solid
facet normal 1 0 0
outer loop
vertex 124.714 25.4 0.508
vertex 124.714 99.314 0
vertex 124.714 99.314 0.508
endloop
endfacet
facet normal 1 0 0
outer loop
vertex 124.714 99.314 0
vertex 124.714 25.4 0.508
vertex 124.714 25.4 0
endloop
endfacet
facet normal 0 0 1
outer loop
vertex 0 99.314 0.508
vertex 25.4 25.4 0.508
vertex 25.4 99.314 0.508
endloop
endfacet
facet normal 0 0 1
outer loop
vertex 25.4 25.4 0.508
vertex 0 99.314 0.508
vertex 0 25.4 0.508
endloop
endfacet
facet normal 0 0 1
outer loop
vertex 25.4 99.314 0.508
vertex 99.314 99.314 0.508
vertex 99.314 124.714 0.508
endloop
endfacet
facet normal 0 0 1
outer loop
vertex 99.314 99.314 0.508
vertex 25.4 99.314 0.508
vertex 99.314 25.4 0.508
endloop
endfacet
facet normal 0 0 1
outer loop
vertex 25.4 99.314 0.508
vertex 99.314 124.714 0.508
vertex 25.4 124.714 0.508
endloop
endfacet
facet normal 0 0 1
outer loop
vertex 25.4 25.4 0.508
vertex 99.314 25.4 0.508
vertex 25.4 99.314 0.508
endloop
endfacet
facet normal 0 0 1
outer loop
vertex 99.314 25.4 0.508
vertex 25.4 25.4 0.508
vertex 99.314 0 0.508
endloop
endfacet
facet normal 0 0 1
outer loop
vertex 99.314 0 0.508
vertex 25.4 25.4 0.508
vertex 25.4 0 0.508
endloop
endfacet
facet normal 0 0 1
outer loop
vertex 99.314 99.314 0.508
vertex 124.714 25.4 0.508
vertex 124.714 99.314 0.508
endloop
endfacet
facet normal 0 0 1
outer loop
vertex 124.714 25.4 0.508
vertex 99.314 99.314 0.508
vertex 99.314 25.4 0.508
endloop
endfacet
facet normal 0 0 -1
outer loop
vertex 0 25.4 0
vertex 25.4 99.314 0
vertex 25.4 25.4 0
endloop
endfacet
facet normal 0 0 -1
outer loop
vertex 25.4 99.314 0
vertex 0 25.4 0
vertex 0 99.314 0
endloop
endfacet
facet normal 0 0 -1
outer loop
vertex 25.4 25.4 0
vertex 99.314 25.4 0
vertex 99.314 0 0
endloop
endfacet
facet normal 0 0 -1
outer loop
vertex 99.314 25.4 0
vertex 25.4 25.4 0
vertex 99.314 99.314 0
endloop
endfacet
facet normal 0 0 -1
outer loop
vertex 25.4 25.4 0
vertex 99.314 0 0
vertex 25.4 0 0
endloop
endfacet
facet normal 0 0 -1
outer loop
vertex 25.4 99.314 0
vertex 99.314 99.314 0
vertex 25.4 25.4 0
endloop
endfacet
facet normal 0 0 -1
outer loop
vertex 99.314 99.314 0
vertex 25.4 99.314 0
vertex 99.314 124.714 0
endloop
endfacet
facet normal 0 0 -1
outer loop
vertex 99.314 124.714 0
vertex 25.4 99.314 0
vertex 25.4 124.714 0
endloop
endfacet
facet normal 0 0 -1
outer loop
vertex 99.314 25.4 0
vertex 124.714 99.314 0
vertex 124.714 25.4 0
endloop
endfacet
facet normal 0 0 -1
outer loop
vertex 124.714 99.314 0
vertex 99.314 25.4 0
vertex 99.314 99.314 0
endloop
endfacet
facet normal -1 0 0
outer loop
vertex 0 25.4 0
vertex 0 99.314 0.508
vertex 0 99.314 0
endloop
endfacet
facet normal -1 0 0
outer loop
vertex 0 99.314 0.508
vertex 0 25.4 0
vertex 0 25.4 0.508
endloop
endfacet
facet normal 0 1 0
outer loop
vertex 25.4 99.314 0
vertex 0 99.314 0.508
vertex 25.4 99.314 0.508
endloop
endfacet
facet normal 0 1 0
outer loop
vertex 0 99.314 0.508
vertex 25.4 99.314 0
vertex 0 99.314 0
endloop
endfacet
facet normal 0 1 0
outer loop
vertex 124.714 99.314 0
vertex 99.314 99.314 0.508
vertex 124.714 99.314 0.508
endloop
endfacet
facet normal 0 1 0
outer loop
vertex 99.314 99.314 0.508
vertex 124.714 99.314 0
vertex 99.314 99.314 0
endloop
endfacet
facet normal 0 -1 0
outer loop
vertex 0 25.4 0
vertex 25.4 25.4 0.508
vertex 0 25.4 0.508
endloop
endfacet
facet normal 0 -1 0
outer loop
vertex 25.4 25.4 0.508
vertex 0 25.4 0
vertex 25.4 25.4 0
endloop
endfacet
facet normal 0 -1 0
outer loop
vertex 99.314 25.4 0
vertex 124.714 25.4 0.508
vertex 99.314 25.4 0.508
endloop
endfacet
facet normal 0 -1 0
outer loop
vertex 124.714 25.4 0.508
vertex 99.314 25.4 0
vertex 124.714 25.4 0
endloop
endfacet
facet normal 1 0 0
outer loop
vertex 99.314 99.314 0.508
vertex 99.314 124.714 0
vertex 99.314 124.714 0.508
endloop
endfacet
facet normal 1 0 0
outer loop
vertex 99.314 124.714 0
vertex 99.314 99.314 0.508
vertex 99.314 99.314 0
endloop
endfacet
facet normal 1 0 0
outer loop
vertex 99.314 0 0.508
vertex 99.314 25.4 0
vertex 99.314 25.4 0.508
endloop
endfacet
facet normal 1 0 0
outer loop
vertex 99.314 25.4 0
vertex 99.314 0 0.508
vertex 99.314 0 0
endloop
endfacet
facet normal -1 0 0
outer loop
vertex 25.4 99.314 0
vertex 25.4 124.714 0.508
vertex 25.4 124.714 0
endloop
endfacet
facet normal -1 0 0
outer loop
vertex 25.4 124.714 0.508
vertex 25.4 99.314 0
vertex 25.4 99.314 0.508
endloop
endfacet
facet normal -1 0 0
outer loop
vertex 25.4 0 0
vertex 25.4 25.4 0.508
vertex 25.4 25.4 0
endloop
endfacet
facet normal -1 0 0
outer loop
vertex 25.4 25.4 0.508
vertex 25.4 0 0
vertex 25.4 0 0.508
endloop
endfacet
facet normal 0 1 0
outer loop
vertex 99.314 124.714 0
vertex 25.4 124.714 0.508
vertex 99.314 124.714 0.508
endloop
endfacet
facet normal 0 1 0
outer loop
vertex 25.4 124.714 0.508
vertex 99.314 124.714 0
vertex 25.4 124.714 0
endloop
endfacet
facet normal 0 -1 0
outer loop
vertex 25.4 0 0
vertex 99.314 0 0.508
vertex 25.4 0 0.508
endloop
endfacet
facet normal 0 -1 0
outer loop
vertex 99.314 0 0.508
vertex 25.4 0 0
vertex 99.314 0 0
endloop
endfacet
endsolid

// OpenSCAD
sideHeight = 1;
width = 2.91;
templateHeight = 0.02;

wingLength = width+(sideHeight*2);


module VelvetTemplate() {
  translate([0,sideHeight,0])
  cube([wingLength, width, templateHeight]);

  translate([sideHeight,0,0])
  cube([width, wingLength, templateHeight]);
}

scale(25.4)
VelvetTemplate();
